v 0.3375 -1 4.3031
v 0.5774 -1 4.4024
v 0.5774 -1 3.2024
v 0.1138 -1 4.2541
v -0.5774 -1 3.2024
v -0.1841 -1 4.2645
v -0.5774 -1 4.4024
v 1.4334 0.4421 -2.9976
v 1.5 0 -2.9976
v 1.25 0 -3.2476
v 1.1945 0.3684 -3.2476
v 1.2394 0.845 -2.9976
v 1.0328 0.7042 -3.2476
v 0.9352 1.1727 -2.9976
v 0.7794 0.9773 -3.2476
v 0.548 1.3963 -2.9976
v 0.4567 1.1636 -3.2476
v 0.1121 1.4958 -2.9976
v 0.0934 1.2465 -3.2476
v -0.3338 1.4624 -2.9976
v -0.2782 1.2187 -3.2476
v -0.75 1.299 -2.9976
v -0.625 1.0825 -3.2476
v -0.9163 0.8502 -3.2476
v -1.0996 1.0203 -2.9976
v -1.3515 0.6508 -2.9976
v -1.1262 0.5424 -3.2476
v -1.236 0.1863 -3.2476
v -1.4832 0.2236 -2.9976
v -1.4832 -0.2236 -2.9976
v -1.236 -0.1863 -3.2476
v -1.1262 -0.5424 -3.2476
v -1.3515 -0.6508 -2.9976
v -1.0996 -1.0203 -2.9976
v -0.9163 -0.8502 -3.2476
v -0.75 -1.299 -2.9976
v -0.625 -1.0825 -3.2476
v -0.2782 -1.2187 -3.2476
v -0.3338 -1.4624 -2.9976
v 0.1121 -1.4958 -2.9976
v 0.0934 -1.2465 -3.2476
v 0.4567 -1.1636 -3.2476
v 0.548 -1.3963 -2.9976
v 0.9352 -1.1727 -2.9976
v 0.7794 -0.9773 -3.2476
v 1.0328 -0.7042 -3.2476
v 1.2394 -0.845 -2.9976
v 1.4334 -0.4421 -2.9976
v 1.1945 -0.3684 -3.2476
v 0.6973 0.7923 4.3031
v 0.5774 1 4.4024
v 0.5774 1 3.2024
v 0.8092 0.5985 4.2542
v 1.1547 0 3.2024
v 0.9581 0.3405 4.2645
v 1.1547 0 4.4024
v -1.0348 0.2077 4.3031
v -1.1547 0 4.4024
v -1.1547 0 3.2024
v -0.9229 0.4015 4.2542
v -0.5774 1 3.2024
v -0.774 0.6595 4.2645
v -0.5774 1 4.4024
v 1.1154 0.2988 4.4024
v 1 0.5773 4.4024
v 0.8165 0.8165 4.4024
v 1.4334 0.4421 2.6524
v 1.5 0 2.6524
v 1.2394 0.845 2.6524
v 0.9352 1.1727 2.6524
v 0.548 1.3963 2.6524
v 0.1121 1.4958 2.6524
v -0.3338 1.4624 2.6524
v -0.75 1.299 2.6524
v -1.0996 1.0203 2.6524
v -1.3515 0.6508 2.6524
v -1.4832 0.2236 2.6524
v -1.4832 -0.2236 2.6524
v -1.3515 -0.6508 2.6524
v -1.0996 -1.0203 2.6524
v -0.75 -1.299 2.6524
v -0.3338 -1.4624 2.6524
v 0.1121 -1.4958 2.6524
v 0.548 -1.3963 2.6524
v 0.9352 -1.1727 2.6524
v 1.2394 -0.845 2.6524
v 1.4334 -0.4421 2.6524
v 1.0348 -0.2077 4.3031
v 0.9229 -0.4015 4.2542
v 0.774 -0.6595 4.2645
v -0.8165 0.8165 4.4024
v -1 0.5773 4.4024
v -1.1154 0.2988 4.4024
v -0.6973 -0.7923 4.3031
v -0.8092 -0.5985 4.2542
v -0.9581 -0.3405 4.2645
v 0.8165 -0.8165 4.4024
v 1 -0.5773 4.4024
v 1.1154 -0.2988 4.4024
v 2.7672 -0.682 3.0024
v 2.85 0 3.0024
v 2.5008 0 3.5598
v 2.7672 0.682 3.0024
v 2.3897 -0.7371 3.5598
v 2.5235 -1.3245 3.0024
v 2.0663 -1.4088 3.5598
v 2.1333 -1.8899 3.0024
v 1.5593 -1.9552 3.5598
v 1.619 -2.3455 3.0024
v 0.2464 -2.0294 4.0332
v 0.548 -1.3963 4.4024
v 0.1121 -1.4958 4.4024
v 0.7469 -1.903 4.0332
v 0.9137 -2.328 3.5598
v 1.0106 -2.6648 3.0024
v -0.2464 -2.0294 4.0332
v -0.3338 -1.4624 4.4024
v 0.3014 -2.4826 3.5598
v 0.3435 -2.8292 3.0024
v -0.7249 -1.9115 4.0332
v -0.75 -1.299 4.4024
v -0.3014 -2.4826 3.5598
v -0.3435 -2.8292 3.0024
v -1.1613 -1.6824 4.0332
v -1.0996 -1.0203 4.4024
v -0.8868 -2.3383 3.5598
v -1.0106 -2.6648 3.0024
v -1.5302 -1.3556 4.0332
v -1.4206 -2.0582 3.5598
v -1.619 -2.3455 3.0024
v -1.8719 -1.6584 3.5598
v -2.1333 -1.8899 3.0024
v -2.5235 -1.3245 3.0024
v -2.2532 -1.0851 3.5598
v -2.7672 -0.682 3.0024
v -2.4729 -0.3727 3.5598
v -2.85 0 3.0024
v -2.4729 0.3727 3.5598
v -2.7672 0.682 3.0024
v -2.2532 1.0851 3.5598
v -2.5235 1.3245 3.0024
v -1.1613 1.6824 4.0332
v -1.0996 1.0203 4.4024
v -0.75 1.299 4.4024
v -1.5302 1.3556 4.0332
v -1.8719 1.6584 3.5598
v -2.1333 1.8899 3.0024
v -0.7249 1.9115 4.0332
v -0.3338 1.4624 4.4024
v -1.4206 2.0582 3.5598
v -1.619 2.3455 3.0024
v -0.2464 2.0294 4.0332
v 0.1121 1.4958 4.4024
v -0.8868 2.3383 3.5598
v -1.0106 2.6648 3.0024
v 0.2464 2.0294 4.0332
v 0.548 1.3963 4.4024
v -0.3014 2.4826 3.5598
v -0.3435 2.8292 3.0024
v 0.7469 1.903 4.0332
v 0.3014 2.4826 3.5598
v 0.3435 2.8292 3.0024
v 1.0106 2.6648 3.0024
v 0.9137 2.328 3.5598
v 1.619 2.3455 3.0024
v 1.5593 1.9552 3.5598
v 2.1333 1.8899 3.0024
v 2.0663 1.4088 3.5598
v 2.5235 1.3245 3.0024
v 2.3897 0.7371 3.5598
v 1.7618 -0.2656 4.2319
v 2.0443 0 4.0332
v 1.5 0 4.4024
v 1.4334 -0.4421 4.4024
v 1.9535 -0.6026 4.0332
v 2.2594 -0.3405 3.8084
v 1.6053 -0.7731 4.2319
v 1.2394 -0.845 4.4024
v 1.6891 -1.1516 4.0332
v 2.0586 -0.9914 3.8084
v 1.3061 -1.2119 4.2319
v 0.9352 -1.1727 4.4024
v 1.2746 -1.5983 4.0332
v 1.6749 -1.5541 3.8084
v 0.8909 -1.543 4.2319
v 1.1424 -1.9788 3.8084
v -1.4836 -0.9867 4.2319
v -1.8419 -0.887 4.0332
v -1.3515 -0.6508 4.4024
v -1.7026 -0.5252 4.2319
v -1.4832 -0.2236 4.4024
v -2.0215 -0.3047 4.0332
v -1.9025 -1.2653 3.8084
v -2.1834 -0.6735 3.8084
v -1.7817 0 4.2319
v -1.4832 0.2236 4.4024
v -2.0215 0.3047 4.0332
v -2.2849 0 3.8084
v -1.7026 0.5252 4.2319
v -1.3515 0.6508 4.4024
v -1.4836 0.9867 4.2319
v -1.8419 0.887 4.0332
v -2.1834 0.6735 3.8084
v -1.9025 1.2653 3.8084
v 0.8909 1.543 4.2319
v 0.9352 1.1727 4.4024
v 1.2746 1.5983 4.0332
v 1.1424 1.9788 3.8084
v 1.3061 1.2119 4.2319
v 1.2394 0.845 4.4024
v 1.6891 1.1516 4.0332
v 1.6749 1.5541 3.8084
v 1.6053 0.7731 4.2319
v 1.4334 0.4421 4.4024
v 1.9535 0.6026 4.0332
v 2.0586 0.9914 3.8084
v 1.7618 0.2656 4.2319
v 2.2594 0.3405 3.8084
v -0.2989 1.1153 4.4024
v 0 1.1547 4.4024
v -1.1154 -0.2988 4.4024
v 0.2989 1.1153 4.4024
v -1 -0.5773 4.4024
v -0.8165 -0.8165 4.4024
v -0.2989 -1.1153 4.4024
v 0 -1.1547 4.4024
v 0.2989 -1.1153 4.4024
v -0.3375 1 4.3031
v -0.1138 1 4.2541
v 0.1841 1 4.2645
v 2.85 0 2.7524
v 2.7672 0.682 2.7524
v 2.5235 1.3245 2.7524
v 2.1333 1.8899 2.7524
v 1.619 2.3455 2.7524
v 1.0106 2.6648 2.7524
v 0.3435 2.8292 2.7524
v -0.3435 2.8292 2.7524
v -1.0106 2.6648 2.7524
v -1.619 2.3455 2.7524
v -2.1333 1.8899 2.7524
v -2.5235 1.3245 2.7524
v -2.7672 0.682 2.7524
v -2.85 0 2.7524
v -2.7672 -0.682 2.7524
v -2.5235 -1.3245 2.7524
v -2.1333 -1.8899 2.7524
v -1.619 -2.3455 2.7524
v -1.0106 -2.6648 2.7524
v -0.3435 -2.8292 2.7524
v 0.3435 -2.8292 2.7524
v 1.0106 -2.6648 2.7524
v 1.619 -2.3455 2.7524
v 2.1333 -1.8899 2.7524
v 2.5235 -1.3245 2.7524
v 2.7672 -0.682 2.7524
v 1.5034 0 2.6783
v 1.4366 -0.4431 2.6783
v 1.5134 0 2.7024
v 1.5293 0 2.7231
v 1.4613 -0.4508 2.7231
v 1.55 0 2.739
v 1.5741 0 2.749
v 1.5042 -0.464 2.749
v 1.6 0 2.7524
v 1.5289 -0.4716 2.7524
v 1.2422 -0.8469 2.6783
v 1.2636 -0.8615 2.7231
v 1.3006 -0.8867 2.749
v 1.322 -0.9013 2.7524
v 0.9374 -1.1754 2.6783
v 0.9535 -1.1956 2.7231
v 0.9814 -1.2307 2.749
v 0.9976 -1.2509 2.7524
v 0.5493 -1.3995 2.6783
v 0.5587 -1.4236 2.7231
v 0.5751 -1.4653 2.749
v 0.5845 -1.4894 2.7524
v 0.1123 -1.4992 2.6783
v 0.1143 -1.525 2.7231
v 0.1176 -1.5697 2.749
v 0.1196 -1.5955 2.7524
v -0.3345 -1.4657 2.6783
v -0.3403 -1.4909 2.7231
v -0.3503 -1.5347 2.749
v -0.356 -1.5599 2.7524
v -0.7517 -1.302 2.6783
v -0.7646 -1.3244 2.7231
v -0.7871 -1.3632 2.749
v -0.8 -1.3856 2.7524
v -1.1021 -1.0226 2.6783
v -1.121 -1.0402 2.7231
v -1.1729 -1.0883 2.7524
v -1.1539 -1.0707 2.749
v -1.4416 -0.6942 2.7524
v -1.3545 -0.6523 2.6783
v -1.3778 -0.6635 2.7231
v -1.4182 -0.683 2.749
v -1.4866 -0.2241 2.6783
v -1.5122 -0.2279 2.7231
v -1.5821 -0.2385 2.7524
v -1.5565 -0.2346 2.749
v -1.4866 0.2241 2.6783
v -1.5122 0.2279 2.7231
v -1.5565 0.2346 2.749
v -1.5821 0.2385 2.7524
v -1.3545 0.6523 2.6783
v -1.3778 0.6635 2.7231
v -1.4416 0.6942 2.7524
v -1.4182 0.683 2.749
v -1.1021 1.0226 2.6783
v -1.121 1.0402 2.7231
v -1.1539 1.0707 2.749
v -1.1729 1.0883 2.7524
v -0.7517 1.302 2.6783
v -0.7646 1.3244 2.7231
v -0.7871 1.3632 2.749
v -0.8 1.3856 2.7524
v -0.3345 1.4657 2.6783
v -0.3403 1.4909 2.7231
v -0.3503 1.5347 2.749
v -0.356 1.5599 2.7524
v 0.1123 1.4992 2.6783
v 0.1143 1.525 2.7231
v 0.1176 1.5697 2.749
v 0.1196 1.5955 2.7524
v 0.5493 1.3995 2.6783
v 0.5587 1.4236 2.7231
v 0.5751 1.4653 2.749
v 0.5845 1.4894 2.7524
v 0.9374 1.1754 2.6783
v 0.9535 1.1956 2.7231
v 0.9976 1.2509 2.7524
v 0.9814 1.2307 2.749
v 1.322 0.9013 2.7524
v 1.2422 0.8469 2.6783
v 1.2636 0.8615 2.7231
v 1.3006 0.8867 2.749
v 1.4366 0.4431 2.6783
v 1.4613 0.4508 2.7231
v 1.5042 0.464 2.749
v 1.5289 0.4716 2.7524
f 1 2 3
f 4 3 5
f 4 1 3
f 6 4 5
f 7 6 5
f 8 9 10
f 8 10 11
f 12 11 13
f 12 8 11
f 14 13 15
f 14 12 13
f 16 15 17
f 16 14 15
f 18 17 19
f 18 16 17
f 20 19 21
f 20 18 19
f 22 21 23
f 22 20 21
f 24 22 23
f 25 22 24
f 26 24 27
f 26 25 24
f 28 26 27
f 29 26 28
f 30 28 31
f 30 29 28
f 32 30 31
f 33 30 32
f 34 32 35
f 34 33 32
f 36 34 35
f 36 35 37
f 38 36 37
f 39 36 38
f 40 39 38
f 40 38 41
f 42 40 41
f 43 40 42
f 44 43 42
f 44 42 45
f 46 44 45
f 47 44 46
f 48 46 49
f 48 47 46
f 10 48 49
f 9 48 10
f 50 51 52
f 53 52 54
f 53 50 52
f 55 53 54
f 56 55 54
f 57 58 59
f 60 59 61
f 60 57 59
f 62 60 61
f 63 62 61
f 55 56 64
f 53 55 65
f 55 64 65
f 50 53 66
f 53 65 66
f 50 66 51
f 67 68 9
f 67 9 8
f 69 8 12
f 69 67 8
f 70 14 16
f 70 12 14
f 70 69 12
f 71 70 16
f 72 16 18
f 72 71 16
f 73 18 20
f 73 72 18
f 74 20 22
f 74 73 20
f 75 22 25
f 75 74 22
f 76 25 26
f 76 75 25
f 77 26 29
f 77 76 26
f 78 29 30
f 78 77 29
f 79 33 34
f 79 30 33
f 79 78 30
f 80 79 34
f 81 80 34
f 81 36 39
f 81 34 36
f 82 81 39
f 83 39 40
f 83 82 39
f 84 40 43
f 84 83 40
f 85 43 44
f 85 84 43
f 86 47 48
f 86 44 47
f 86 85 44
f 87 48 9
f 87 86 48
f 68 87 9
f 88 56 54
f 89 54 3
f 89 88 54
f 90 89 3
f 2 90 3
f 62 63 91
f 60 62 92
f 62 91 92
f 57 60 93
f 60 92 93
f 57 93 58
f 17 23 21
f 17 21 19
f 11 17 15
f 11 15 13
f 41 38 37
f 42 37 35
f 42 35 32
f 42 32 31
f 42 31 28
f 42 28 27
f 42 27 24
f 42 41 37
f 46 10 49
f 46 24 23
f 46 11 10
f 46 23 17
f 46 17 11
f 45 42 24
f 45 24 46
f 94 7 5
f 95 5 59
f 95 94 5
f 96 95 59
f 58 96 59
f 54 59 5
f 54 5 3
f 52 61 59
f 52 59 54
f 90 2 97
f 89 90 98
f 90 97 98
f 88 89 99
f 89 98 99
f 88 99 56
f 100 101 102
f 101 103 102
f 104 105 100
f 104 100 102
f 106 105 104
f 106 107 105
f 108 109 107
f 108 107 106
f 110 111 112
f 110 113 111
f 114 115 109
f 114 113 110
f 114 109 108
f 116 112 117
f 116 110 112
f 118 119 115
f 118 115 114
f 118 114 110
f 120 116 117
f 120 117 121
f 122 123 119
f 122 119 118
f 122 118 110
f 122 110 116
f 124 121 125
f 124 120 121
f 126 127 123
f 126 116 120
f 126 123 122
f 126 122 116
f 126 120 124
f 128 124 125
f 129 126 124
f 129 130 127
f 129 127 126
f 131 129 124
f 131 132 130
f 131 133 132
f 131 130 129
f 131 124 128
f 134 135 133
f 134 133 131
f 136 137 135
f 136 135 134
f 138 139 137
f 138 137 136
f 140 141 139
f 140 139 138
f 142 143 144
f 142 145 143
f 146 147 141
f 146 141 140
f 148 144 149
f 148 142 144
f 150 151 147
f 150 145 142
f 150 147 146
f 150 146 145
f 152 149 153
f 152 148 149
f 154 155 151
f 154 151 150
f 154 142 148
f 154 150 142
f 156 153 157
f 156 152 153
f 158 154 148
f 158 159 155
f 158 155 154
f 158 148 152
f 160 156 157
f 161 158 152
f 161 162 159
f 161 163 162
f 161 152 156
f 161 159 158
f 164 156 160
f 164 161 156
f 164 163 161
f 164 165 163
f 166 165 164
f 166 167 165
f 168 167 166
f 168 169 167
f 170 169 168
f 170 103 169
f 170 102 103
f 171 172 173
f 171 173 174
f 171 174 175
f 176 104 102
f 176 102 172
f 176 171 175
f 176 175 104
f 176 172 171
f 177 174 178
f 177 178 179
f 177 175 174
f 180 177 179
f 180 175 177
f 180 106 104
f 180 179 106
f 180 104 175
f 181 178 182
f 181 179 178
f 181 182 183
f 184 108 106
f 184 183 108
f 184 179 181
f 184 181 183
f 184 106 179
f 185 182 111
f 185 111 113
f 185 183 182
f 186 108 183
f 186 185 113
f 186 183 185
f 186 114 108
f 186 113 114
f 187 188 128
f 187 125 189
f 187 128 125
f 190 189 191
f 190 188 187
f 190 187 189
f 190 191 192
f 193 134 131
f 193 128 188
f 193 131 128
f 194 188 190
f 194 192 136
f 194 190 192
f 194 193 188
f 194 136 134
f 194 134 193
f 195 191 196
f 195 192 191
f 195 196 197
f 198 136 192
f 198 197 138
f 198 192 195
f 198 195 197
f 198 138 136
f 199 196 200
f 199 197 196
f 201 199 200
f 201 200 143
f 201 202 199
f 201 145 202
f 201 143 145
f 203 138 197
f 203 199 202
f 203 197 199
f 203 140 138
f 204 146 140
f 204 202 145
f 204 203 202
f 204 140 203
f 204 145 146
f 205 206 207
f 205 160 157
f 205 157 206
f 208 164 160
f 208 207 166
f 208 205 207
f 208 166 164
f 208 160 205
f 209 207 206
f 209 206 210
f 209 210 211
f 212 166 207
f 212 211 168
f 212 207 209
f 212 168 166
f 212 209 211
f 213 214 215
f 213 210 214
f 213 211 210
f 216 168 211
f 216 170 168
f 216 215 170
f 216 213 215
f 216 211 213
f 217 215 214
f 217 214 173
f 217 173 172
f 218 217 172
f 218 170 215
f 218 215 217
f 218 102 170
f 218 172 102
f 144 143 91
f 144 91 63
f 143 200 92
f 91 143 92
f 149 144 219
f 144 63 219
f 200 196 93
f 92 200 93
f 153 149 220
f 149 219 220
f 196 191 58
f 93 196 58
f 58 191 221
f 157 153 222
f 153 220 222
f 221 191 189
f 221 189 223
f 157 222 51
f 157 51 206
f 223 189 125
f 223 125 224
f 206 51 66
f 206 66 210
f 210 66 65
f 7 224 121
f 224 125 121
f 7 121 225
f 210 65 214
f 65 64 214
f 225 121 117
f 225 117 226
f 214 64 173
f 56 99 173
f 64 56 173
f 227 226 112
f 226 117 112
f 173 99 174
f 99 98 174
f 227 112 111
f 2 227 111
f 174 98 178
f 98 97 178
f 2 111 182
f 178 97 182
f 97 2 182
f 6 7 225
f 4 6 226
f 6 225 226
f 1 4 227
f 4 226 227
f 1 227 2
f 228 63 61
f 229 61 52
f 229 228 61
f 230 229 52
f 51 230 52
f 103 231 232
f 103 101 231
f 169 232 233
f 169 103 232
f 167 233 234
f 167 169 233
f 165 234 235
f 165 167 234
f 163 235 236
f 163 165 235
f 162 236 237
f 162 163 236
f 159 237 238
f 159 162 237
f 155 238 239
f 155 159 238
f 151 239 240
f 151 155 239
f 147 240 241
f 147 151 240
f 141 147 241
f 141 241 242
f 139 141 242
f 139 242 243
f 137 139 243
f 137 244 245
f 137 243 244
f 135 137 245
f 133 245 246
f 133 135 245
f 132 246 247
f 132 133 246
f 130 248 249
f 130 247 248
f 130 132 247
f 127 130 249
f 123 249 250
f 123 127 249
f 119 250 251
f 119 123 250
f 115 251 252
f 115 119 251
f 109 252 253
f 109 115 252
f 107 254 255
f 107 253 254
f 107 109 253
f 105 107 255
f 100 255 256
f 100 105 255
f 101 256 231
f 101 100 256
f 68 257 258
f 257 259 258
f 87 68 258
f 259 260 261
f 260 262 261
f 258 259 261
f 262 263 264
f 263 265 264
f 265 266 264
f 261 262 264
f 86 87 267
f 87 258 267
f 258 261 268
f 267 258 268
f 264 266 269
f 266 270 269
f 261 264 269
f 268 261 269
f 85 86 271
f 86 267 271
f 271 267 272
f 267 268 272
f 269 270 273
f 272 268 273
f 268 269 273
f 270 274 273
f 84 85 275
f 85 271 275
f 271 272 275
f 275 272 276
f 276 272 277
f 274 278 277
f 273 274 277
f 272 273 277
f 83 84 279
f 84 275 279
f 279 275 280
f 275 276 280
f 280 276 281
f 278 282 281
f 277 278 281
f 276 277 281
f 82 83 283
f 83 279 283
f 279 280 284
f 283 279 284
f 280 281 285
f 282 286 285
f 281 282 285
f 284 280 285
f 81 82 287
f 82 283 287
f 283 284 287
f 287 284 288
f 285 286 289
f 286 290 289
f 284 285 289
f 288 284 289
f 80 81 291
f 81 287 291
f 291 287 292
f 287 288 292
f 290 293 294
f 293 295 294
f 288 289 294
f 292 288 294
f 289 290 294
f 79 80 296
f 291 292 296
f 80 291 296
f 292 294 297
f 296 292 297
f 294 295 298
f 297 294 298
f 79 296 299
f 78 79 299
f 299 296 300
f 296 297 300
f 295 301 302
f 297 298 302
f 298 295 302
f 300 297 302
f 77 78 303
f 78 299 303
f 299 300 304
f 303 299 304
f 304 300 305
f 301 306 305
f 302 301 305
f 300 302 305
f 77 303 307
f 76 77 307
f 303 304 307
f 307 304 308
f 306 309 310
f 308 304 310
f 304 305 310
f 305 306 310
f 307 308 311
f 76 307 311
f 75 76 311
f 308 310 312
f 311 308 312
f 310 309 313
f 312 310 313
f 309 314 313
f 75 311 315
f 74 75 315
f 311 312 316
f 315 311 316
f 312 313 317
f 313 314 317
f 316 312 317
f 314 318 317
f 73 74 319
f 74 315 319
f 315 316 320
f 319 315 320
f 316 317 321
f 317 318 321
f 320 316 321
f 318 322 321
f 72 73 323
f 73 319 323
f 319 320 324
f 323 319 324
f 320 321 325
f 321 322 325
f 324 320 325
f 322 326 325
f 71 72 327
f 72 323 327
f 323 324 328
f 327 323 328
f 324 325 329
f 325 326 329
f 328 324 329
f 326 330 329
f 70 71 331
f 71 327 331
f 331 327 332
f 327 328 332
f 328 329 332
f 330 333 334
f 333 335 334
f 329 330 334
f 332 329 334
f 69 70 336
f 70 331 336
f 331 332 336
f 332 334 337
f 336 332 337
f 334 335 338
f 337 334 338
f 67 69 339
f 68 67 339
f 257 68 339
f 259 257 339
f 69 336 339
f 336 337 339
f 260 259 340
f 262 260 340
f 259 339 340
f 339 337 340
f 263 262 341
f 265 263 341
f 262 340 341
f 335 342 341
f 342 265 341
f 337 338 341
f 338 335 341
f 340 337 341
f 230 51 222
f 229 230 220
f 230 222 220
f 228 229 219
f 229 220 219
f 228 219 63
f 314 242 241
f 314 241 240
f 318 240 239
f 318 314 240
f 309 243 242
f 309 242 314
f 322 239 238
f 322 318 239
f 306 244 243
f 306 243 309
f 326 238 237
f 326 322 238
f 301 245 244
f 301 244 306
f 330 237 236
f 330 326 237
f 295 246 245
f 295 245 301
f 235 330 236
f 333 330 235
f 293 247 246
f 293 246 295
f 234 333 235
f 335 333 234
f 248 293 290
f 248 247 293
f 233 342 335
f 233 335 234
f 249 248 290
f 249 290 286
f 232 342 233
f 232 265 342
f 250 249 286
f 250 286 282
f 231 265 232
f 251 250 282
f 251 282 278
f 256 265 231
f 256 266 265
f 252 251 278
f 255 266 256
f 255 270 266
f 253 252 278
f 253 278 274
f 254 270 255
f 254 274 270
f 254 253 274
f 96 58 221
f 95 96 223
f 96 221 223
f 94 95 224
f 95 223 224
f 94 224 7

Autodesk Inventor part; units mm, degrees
ref_plane "YZ Plane" through (0, 0, 0) normal (1, 0, 0) x (0, 1, 0)
ref_plane "XZ Plane" through (0, 0, 0) normal (0, 1, 0) x (-1, 0, 0)
ref_plane "XY Plane" through (0, 0, 0) normal (0, 0, 1) x (1, 0, 0)
sketch "Sketch1" plane through (0, 0, 0) normal (0, 1, 0) x (-1, 0, 0)
  line L0 (0, 3.2476) -> (0, -3.2476)
  line L1 (0, -3.2476) -> (-1.25, -3.2476)
  line L2 (-1.25, -3.2476) -> (-1.5, -2.9976)
  line L3 (-1.5, -2.9976) -> (-1.5, 2.6524)
  line L4 (-1.6, 2.7524) -> (-2.85, 2.7524)
  line L5 (-2.85, 2.7524) -> (-2.85, 3.0024)
  line L6 (0, 3.2476) -> (-1.1547, 4.4024)
  line L7 (-1.1547, 4.4024) -> (-1.5, 4.4024)
  arc A0 (-1.5, 4.4024) -> (-2.85, 3.0024) centre (0, 1.605) ccw
  line L8 (-1.1547, 4.4024) -> (-0.5774, 5.4024) construction
  line L9 (-0.5774, 5.4024) -> (0.5774, 5.4024) construction
  line L10 (0.5774, 5.4024) -> (1.1547, 4.4024) construction
  line L11 (1.1547, 4.4024) -> (0.5774, 3.4024) construction
  line L12 (0.5774, 3.4024) -> (-0.5774, 3.4024) construction
  line L13 (-0.5774, 3.4024) -> (-1.1547, 4.4024) construction
  arc A1 (-1.5, 2.6524) -> (-1.6, 2.7524) centre (-1.6, 2.6524) ccw
  point P0 (0, 0)
  point P1 (-1.5, 2.7524)
  point P2 (0, 0)
  point P3 (0, 4.4024)
  dimension "d0" = 3
  dimension "d1" = 6
  dimension "d2" = 0.25
  dimension "d3" = 135
  dimension "d4" = 5.7
  dimension "d5" = 3
  dimension "d6" = 1.65
  dimension "d7" = 2
  dimension "d8" = 0.25
  dimension "d15" = 3.2
revolve "Revolution1" add sketch "Sketch1" angle 360 about axis through (0, 0, 3.2476) along (0, 0, -1)
sketch "Sketch2" plane through (0, 0, 4.4024) normal (0, 0, 1) x (1, 0, 0)
  circle A0 centre (0, 0) radius 1.1547
  circle A1 centre (0, 0) radius 1.5
  line L0 (-1.1547, 0) -> (-0.5774, 1)
  line L1 (-0.5774, 1) -> (0.5774, 1)
  line L2 (0.5774, 1) -> (1.1547, 0)
  line L3 (1.1547, 0) -> (0.5774, -1)
  line L4 (0.5774, -1) -> (-0.5774, -1)
  line L5 (-0.5774, -1) -> (-1.1547, 0)
  point P0 (0, 0)
extrude "Extrusion1" cut sketch "Sketch2" against normal blind 1.2 contours L3 L4 L5 L0 L1 L2
thread "Thread1"
properties part number "Bolt_M3x0.35_6mm_BH" material "Stainless Steel"
